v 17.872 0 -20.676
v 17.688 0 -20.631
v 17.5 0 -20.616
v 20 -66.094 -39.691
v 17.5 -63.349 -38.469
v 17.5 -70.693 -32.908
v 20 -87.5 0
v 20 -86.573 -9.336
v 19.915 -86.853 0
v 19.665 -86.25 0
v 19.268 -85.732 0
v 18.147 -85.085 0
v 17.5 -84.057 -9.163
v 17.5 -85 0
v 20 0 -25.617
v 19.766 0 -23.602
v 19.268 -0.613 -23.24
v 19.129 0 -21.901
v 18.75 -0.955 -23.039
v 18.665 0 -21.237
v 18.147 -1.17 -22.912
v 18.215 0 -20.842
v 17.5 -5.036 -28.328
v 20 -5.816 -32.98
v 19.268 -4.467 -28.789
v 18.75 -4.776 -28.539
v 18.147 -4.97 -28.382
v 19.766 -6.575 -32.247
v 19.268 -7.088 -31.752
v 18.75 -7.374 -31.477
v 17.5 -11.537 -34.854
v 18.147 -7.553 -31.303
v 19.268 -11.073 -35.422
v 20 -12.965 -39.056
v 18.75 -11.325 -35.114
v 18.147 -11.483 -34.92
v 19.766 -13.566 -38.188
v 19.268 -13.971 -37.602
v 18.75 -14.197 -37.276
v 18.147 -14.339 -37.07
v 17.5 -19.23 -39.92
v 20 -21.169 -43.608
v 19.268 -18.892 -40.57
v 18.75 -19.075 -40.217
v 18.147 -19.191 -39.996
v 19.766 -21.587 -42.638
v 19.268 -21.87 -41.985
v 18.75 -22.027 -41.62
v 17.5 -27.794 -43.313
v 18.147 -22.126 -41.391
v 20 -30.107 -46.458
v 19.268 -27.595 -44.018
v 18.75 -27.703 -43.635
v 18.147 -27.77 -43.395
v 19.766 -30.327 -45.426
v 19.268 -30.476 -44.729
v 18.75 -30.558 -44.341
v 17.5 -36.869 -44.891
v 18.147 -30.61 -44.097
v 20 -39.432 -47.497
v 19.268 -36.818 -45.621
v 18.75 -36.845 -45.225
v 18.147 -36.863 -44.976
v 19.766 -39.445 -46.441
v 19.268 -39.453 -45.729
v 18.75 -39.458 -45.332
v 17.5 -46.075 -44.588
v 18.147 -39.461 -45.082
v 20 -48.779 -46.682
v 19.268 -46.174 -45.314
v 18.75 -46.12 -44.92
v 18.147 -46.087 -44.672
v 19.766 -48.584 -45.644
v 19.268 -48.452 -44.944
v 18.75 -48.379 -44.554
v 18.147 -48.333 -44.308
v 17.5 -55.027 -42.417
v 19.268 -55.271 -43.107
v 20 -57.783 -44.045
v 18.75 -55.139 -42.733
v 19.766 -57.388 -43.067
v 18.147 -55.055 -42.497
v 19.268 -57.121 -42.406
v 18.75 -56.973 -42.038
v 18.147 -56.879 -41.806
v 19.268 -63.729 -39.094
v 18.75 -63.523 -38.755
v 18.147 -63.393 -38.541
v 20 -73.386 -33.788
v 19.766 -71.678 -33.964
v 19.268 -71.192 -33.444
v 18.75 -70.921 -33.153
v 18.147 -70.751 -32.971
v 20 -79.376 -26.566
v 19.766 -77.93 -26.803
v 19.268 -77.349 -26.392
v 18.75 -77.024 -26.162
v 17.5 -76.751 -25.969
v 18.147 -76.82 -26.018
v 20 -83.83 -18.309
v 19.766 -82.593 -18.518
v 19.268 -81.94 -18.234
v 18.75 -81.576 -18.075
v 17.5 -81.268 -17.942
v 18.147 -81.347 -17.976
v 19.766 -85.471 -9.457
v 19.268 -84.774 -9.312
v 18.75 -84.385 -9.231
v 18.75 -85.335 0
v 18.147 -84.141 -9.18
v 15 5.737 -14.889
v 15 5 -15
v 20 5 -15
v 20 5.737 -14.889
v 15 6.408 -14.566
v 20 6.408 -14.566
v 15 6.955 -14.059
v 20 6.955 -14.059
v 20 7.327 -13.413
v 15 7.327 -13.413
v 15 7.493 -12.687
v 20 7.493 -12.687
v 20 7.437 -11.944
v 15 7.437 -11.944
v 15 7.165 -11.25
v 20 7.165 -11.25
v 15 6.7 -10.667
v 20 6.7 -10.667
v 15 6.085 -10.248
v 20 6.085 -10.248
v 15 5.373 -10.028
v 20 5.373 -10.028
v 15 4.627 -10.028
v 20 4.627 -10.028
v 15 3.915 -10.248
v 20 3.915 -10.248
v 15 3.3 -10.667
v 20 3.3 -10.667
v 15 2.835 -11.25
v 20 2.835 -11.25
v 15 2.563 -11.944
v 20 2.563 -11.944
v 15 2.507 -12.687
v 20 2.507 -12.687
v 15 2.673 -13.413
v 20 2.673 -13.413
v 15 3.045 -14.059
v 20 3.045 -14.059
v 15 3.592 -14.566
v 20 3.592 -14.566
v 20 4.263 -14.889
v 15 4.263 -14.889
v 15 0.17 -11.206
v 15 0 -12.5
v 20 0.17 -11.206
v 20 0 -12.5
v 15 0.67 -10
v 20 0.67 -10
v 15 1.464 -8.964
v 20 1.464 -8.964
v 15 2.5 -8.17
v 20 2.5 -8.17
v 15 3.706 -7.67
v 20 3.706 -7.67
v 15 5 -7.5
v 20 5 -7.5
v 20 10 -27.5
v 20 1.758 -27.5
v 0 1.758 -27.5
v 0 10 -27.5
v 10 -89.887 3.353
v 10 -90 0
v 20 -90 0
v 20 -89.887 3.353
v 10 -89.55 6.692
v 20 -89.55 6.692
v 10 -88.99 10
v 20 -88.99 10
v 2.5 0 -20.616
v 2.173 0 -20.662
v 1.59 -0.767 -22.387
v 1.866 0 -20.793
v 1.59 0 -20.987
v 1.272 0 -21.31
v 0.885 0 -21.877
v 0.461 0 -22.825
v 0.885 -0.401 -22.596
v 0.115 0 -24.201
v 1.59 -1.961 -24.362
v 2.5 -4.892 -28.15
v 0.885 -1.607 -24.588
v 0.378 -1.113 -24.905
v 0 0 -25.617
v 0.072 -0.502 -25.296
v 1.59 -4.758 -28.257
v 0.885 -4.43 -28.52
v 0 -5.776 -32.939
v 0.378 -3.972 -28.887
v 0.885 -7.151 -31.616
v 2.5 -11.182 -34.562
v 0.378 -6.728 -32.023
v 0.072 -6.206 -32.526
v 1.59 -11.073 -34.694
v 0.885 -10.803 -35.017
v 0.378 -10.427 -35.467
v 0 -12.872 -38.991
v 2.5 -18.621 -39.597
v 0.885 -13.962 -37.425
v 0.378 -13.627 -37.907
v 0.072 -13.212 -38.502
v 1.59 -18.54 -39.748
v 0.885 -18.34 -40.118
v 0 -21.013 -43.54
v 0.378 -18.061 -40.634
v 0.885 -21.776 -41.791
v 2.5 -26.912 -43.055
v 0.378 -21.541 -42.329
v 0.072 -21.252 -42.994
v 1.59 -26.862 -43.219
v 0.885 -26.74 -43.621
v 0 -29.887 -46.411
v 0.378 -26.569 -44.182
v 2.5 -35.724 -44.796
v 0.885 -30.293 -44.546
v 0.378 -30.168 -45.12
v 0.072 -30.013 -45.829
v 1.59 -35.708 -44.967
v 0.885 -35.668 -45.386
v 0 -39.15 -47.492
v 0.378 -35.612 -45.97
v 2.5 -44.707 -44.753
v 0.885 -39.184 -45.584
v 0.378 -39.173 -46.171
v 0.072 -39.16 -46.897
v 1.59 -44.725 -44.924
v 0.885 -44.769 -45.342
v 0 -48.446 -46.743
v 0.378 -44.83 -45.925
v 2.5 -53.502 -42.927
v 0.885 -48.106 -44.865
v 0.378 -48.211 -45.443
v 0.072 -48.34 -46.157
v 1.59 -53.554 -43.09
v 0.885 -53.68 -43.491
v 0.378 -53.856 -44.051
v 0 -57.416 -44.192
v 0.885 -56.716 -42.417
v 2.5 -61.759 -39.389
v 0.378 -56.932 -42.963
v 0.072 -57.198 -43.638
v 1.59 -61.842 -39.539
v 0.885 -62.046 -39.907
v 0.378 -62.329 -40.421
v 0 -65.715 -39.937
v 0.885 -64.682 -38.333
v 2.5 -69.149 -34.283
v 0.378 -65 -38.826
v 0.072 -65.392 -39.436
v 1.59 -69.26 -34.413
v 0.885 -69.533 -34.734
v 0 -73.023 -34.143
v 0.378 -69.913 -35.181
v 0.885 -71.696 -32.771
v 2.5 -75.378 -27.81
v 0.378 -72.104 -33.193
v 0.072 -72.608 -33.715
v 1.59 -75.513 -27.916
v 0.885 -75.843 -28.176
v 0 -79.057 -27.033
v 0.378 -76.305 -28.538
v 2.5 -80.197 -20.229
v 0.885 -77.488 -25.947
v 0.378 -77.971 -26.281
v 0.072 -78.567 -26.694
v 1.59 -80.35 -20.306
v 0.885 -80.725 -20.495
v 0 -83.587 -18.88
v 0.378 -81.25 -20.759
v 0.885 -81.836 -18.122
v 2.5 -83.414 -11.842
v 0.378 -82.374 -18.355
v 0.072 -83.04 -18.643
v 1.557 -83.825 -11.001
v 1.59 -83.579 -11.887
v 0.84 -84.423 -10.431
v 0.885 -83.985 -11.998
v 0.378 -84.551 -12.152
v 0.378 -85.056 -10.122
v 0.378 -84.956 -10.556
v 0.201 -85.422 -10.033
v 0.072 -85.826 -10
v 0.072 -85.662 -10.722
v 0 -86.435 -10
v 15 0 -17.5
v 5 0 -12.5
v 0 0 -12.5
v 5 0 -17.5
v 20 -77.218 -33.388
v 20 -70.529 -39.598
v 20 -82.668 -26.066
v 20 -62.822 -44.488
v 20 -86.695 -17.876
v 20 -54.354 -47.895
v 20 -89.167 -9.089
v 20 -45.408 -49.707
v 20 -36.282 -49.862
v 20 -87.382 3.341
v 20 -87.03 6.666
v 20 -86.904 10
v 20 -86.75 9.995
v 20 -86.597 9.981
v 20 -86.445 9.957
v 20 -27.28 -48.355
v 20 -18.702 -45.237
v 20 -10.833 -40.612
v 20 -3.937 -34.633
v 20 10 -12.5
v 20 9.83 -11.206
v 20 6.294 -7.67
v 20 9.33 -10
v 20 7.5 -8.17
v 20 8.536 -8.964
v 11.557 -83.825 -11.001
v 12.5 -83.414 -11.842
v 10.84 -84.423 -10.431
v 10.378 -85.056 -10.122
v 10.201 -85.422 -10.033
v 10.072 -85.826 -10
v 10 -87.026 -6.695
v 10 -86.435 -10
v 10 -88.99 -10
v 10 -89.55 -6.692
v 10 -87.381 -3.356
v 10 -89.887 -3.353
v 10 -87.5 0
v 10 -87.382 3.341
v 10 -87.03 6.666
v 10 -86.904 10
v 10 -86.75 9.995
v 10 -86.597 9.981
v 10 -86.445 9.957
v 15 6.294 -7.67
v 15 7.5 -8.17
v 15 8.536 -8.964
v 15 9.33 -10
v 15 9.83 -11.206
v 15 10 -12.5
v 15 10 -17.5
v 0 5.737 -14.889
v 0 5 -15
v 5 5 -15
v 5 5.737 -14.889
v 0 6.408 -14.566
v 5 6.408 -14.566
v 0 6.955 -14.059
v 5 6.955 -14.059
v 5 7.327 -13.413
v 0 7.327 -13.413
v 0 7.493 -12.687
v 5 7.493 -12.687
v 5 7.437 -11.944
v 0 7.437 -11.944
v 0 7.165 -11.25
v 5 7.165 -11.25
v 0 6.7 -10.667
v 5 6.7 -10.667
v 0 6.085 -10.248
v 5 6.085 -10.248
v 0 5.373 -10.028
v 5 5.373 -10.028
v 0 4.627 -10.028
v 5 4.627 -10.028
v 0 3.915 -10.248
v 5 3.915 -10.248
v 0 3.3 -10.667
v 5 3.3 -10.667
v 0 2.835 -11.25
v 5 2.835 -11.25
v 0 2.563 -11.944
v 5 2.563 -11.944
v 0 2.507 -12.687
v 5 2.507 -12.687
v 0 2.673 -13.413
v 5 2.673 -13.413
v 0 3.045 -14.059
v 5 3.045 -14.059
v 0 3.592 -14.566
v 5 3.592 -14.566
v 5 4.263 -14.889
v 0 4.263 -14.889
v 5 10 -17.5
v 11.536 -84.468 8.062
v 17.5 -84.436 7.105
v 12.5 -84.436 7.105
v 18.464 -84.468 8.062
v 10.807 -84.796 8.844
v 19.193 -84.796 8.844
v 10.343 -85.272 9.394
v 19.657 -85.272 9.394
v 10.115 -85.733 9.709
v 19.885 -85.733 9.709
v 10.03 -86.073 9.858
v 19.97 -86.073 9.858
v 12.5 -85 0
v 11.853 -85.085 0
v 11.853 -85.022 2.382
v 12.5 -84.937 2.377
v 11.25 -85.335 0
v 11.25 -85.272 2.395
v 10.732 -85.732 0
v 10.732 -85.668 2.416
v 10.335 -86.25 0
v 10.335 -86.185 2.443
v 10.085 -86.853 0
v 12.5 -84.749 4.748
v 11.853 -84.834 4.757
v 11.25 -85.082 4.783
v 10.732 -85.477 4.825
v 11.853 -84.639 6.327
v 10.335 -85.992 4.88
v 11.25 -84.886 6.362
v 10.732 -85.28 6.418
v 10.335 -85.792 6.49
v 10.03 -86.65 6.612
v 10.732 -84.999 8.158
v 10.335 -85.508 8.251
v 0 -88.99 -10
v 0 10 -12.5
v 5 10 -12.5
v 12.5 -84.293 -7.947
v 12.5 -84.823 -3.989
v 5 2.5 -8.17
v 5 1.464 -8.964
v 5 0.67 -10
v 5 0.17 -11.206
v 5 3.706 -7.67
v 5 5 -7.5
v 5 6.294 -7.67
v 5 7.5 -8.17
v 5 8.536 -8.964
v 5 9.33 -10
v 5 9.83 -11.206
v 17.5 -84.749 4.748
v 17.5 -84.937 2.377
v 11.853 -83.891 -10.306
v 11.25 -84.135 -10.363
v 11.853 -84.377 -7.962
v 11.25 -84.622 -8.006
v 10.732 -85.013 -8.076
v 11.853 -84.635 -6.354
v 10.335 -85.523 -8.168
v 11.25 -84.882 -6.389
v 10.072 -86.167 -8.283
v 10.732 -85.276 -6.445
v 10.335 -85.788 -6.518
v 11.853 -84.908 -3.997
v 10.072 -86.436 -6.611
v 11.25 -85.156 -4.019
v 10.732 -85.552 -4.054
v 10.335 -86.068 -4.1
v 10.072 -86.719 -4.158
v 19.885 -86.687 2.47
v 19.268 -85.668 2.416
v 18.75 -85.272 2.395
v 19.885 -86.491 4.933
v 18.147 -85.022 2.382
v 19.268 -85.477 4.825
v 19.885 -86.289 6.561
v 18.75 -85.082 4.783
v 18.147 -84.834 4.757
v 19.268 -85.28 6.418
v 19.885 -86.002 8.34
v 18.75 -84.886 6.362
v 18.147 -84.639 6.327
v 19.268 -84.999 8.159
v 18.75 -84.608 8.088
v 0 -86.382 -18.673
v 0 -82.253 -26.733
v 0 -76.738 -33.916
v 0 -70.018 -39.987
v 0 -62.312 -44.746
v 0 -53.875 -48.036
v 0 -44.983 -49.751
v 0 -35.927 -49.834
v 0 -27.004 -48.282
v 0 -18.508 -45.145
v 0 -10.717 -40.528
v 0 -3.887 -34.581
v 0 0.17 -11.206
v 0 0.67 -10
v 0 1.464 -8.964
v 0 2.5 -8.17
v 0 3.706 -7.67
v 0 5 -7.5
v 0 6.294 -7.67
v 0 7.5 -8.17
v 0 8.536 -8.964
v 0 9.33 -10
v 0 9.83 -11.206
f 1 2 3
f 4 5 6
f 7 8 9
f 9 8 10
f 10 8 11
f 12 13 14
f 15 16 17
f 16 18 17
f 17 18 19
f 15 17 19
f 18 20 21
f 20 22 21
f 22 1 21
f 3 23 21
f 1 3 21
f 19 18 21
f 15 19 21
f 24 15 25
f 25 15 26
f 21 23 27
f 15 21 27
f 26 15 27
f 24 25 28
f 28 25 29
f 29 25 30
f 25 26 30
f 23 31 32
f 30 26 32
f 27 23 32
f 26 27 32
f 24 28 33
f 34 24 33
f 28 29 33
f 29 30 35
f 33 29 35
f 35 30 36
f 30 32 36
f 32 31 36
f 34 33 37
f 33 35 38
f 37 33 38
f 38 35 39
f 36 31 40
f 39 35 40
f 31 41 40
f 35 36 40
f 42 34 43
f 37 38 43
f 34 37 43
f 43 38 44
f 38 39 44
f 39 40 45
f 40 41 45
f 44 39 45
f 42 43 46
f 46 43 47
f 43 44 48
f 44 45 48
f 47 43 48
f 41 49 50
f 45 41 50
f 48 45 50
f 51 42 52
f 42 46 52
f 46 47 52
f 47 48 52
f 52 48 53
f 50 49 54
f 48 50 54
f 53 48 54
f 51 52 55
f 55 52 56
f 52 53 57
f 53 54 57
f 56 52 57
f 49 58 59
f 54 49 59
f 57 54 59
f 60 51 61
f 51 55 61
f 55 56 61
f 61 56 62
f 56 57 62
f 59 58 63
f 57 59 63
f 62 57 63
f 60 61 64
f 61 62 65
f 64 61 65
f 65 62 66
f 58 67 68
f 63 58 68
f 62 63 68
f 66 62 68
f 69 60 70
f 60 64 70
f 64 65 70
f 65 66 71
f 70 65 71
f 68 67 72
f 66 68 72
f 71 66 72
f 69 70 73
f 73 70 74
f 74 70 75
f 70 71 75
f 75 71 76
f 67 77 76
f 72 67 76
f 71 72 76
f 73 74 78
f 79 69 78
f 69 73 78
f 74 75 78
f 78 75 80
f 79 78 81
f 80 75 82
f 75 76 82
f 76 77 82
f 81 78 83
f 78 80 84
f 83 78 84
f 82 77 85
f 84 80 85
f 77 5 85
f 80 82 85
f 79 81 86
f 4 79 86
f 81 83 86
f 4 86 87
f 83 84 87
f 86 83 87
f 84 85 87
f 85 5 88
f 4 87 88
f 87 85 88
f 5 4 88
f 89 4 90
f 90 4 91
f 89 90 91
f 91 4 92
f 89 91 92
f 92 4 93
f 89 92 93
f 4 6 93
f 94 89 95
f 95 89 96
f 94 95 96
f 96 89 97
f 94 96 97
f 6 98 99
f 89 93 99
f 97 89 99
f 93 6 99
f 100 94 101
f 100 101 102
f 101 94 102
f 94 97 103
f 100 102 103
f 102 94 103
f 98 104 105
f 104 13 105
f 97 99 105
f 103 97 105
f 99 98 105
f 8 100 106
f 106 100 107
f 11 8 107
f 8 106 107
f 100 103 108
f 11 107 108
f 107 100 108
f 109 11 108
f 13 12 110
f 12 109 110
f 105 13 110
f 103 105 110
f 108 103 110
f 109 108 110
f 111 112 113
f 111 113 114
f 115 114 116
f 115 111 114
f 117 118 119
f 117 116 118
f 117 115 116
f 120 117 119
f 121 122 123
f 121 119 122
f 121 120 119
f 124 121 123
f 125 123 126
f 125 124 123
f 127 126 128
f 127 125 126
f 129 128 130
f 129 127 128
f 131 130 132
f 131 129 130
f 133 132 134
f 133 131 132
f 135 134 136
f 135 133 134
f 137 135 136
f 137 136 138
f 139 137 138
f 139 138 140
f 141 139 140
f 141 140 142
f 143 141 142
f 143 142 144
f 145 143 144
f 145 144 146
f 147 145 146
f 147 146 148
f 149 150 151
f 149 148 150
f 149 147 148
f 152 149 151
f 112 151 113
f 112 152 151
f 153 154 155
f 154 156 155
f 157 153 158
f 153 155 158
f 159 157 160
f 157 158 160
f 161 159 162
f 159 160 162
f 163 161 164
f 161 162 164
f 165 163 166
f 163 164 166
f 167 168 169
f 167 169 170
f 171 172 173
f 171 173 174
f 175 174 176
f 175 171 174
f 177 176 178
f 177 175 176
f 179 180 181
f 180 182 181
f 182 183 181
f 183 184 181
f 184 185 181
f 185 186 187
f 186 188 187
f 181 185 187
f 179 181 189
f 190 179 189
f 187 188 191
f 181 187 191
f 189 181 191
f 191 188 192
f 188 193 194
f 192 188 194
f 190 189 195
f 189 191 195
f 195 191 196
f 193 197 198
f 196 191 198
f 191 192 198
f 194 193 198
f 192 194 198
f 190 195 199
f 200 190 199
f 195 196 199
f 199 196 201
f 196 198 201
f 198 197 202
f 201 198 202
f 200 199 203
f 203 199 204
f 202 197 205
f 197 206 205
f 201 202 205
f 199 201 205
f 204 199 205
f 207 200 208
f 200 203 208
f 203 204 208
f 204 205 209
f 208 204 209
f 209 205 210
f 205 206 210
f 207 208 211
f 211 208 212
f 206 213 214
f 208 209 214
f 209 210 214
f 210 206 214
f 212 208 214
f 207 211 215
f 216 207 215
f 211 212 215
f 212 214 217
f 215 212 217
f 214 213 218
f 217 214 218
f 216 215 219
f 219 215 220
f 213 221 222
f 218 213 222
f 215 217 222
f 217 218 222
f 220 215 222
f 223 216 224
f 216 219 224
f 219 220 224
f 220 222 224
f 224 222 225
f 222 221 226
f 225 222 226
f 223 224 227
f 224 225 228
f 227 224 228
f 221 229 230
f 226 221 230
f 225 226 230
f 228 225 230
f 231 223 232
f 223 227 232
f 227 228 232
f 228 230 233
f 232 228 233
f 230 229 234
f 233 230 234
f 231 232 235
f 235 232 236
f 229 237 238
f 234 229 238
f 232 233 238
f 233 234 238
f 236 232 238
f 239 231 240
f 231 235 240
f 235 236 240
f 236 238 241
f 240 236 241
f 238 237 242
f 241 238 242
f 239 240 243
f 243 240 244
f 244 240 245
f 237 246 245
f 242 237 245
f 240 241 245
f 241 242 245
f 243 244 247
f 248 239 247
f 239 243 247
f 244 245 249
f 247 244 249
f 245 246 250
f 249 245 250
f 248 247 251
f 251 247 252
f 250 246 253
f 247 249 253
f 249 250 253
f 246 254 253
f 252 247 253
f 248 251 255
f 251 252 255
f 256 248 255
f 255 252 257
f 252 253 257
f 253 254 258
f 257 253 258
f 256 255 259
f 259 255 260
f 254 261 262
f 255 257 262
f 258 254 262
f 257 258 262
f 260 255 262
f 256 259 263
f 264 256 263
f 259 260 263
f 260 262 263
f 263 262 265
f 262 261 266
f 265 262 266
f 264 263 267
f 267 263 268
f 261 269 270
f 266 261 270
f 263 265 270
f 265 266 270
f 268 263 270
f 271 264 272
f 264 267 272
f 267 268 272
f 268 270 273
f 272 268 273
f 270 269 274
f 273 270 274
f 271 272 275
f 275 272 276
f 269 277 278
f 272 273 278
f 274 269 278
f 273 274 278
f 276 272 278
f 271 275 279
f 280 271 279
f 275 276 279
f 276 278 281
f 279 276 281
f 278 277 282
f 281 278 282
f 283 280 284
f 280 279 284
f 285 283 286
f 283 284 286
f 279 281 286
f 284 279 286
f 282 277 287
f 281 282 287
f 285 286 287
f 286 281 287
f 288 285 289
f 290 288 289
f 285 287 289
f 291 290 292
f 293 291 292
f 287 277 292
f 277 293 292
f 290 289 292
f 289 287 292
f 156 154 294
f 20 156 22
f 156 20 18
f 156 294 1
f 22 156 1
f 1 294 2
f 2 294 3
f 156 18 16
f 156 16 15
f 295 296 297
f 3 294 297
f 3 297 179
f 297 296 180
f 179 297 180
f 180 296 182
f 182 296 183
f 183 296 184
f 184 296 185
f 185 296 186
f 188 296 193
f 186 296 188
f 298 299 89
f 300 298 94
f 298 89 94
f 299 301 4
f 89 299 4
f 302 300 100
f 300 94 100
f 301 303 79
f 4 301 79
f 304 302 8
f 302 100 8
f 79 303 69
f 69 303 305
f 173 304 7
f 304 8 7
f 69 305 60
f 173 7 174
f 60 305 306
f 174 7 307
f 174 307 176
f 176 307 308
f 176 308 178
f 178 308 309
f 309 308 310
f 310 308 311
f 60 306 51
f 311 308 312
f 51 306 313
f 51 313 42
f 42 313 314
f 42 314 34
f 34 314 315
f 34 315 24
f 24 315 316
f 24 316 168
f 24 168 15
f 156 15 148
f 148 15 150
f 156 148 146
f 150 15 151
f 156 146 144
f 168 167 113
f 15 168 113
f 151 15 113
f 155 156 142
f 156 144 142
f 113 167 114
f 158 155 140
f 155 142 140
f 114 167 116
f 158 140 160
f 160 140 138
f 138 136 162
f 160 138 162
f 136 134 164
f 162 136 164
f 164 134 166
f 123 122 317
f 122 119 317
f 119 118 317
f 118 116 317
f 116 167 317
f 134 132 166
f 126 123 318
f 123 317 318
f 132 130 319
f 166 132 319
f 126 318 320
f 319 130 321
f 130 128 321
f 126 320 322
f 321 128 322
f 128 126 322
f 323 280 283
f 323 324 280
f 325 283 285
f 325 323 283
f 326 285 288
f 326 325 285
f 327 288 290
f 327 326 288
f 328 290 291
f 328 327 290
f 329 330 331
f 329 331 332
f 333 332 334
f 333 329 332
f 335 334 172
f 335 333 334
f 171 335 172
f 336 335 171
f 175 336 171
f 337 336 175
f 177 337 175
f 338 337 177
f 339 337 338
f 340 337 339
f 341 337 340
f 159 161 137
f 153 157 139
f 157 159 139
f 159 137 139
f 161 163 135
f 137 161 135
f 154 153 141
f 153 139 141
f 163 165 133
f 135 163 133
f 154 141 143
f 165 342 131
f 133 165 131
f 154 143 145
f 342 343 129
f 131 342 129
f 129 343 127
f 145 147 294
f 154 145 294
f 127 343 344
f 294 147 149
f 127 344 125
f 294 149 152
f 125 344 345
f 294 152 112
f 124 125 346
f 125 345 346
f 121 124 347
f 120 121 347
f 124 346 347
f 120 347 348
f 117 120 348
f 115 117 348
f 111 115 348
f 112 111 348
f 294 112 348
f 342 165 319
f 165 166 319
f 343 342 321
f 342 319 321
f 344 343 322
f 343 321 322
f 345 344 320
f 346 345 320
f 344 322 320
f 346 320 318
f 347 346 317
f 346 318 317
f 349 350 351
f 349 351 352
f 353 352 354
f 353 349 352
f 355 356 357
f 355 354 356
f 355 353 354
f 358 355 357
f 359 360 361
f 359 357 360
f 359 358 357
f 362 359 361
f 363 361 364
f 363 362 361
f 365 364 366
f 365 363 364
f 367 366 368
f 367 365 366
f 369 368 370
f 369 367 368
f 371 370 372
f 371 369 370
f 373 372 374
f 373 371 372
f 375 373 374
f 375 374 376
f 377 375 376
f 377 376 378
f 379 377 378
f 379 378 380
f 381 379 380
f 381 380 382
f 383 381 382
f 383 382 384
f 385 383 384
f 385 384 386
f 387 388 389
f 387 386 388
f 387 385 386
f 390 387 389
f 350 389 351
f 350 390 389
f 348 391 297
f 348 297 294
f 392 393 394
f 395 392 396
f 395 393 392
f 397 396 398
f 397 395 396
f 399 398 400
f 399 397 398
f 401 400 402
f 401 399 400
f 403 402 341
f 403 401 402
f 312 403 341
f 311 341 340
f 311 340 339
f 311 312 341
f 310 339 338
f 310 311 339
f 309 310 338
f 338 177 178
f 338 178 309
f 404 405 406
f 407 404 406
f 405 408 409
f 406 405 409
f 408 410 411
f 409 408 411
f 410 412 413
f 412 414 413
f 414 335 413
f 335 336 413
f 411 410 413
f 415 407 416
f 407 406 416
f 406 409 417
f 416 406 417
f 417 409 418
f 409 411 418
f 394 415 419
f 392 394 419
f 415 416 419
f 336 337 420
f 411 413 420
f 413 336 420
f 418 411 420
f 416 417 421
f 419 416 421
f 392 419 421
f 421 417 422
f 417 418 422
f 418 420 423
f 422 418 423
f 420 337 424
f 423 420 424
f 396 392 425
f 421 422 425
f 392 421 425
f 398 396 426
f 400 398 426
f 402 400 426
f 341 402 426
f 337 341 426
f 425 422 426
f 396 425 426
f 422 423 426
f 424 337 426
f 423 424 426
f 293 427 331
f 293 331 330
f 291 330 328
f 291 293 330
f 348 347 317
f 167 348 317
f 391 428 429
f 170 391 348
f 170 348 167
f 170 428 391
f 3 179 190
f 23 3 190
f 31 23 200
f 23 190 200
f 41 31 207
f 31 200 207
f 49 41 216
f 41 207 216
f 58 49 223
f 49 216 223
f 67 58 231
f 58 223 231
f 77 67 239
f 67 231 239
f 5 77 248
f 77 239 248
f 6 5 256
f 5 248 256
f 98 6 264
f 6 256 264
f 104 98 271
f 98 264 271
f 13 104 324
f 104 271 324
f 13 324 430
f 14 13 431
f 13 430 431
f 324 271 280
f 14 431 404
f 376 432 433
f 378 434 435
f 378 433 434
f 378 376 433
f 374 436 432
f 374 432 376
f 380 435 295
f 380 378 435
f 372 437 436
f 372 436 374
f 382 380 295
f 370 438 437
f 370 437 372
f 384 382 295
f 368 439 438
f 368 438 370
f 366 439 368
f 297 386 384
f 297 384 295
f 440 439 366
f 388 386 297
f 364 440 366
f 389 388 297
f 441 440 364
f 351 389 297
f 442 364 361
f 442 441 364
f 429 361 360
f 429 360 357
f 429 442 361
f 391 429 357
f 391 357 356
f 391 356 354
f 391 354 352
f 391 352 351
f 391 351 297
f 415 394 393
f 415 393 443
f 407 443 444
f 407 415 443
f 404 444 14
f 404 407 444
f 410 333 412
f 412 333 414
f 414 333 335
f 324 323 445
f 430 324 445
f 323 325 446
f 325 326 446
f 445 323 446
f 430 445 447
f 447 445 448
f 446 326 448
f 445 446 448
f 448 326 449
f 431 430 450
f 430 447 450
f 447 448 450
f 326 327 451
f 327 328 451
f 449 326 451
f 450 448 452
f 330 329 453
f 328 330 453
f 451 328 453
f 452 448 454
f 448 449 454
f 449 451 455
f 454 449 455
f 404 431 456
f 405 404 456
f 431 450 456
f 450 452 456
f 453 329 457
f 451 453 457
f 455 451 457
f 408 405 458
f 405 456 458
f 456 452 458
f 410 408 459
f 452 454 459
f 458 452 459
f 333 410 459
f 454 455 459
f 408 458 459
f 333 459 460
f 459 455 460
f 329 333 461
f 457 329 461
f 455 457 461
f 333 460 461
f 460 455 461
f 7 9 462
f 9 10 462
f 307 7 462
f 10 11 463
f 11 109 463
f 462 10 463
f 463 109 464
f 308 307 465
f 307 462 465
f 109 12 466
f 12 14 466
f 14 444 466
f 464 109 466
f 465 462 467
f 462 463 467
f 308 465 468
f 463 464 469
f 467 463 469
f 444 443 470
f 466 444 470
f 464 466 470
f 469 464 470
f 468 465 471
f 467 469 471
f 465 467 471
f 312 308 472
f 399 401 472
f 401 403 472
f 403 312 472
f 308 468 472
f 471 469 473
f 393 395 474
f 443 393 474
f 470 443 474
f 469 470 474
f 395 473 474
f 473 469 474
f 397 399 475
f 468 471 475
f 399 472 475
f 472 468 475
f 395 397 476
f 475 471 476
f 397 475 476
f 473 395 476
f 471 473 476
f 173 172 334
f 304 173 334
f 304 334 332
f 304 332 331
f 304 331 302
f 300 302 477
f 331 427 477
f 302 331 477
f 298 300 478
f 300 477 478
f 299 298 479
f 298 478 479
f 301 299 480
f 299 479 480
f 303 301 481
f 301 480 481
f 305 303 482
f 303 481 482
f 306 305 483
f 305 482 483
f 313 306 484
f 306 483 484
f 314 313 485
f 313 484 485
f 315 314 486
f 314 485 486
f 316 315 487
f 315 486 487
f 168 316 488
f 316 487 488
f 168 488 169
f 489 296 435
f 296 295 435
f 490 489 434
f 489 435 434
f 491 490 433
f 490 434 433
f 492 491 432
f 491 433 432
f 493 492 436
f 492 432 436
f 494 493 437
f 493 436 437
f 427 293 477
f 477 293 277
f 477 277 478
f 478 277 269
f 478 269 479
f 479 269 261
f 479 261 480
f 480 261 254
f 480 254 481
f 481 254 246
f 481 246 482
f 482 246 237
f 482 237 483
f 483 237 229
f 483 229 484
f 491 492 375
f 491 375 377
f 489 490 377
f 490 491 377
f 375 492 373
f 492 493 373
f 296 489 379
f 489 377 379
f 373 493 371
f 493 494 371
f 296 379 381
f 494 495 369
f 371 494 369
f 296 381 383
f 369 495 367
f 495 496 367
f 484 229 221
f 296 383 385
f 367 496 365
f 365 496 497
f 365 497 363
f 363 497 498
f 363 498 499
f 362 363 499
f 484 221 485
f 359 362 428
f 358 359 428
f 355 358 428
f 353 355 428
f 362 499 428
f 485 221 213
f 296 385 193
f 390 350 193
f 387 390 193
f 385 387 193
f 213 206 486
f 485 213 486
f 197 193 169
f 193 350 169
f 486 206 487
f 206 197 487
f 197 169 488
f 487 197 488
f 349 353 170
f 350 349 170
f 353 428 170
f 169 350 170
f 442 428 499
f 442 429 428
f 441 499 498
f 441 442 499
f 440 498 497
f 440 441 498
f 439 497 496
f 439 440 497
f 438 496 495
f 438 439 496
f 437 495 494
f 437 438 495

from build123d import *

# Parameters (mm, degrees)
SKETCH3_W               = 20
SKETCH3_H               = 10
BOSS_EXTRUDE2_DEPTH     = 20
CUT_EXTRUDE2_REACH      = 37.444
SKETCH4_W               = 10
SKETCH4_H               = 10
CUT_EXTRUDE3_DEPTH      = 33.882366095
CUT_EXTRUDE3_DEPTH_BACK = 33.882366095
SKETCH5_R               = 2.5
BOSS_EXTRUDE3_DEPTH     = 20
BOSS_EXTRUDE4_START     = -10
BOSS_EXTRUDE4_DEPTH     = 10
CUT_EXTRUDE4_DEPTH      = 10
FILLET1_R               = 5
FILLET2_R               = 2.5


with BuildPart() as part:
    # Sketch3 → Boss-Extrude2 (new body)
    with BuildSketch(Plane(origin=(0, 0, 0), x_dir=(0, 0, -1), z_dir=(1, 0, 0))):
        with Locations((17.5, 5)):
            Rectangle(SKETCH3_W, SKETCH3_H)
    extrude(amount=BOSS_EXTRUDE2_DEPTH)

    # Sketch4 → Cut-Extrude2 (cut, up to next)
    with BuildSketch(Plane(origin=(0, 10, 0), x_dir=(1, 0, 0), z_dir=(0, 1, 0)), mode=Mode.PRIVATE) as cut_extrude2_sk1:
        with Locations((10, 12.5)):
            Rectangle(SKETCH4_W, SKETCH4_H)
    cut_extrude2_tool1 = extrude(cut_extrude2_sk1.sketch, amount=-CUT_EXTRUDE2_REACH, mode=Mode.PRIVATE) & part.part
    add(cut_extrude2_tool1.solids().sort_by_distance((10, 10, -12.5))[0], mode=Mode.SUBTRACT)

    # Sketch5 → Cut-Extrude3 (cut, two sides: drawn at the far end of the back side and taken through both)
    with BuildSketch(Plane(origin=(5, 0, 0), x_dir=(0, 0, -1), z_dir=(1, 0, 0)).offset(-CUT_EXTRUDE3_DEPTH_BACK)):
        with Locations((12.5, 5)):
            Circle(SKETCH5_R)
    extrude(amount=CUT_EXTRUDE3_DEPTH + CUT_EXTRUDE3_DEPTH_BACK, mode=Mode.SUBTRACT)

    # Sketch6 → Boss-Extrude3 (add)
    with BuildSketch(Plane(origin=(0, 0, 0), x_dir=(0, 0, -1), z_dir=(1, 0, 0))):
        with BuildLine():
            Line((0, -85), (0, -90))
            ThreePointArc((0, -90), (47.895258826, -54.354239164), (27.5, 1.758232721))
            Line((27.5, 1.758232721), (20.615528128, 0))
            ThreePointArc((20.615528128, 0), (43.732139211, -50.606601718), (0, -85))
        make_face()
    extrude(amount=BOSS_EXTRUDE3_DEPTH)

    # Sketch7 → Boss-Extrude4 (add)
    with BuildSketch(Plane(origin=(20, 0, 0), x_dir=(0, 0, -1), z_dir=(1, 0, 0)).offset(BOSS_EXTRUDE4_START)):
        with BuildLine():
            Line((0, -85), (0, -90))
            ThreePointArc((0, -90), (-5.0254481, -89.74680765), (-10, -88.989794856))
            Line((-10, -88.989794856), (-10, -83.874821937))
            ThreePointArc((-10, -83.874821937), (-5.031551095, -84.717820761), (0, -85))
        make_face()
    extrude(amount=BOSS_EXTRUDE4_DEPTH)

    # Sketch8 → Cut-Extrude4 (cut)
    with BuildSketch(Plane.ZY):
        with BuildLine():
            Line((0, -85), (0, -90))
            ThreePointArc((0, -90), (-5.0254481, -89.74680765), (-10, -88.989794856))
            Line((-10, -88.989794856), (-10, -83.874821937))
            ThreePointArc((-10, -83.874821937), (-5.031551095, -84.717820761), (0, -85))
        make_face()
    extrude(amount=-CUT_EXTRUDE4_DEPTH, mode=Mode.SUBTRACT)

    # Fillet1
    fillet1_edges = [part.edges().sort_by_distance(p)[0] for p in [
        (17.5, 0, -7.5),
        (17.5, 10, -7.5),
        (2.5, 10, -7.5),
        (2.5, 0, -7.5),
    ]]
    fillet(fillet1_edges, radius=FILLET1_R - 0.0001)  # a hair under: the kernel refuses the full size

    # Fillet2
    fillet2_edges = [part.edges().sort_by_distance(p)[0] for p in [
        (20, -55.429880165, -42.271962317),
        (0, -45.650302702, -44.643858249),
        (10, -85, 0),
        (15, -83.874821937, 10),
        (5, -83.874821937, -10),
    ]]
    fillet(fillet2_edges, radius=FILLET2_R)


solid = part.part
